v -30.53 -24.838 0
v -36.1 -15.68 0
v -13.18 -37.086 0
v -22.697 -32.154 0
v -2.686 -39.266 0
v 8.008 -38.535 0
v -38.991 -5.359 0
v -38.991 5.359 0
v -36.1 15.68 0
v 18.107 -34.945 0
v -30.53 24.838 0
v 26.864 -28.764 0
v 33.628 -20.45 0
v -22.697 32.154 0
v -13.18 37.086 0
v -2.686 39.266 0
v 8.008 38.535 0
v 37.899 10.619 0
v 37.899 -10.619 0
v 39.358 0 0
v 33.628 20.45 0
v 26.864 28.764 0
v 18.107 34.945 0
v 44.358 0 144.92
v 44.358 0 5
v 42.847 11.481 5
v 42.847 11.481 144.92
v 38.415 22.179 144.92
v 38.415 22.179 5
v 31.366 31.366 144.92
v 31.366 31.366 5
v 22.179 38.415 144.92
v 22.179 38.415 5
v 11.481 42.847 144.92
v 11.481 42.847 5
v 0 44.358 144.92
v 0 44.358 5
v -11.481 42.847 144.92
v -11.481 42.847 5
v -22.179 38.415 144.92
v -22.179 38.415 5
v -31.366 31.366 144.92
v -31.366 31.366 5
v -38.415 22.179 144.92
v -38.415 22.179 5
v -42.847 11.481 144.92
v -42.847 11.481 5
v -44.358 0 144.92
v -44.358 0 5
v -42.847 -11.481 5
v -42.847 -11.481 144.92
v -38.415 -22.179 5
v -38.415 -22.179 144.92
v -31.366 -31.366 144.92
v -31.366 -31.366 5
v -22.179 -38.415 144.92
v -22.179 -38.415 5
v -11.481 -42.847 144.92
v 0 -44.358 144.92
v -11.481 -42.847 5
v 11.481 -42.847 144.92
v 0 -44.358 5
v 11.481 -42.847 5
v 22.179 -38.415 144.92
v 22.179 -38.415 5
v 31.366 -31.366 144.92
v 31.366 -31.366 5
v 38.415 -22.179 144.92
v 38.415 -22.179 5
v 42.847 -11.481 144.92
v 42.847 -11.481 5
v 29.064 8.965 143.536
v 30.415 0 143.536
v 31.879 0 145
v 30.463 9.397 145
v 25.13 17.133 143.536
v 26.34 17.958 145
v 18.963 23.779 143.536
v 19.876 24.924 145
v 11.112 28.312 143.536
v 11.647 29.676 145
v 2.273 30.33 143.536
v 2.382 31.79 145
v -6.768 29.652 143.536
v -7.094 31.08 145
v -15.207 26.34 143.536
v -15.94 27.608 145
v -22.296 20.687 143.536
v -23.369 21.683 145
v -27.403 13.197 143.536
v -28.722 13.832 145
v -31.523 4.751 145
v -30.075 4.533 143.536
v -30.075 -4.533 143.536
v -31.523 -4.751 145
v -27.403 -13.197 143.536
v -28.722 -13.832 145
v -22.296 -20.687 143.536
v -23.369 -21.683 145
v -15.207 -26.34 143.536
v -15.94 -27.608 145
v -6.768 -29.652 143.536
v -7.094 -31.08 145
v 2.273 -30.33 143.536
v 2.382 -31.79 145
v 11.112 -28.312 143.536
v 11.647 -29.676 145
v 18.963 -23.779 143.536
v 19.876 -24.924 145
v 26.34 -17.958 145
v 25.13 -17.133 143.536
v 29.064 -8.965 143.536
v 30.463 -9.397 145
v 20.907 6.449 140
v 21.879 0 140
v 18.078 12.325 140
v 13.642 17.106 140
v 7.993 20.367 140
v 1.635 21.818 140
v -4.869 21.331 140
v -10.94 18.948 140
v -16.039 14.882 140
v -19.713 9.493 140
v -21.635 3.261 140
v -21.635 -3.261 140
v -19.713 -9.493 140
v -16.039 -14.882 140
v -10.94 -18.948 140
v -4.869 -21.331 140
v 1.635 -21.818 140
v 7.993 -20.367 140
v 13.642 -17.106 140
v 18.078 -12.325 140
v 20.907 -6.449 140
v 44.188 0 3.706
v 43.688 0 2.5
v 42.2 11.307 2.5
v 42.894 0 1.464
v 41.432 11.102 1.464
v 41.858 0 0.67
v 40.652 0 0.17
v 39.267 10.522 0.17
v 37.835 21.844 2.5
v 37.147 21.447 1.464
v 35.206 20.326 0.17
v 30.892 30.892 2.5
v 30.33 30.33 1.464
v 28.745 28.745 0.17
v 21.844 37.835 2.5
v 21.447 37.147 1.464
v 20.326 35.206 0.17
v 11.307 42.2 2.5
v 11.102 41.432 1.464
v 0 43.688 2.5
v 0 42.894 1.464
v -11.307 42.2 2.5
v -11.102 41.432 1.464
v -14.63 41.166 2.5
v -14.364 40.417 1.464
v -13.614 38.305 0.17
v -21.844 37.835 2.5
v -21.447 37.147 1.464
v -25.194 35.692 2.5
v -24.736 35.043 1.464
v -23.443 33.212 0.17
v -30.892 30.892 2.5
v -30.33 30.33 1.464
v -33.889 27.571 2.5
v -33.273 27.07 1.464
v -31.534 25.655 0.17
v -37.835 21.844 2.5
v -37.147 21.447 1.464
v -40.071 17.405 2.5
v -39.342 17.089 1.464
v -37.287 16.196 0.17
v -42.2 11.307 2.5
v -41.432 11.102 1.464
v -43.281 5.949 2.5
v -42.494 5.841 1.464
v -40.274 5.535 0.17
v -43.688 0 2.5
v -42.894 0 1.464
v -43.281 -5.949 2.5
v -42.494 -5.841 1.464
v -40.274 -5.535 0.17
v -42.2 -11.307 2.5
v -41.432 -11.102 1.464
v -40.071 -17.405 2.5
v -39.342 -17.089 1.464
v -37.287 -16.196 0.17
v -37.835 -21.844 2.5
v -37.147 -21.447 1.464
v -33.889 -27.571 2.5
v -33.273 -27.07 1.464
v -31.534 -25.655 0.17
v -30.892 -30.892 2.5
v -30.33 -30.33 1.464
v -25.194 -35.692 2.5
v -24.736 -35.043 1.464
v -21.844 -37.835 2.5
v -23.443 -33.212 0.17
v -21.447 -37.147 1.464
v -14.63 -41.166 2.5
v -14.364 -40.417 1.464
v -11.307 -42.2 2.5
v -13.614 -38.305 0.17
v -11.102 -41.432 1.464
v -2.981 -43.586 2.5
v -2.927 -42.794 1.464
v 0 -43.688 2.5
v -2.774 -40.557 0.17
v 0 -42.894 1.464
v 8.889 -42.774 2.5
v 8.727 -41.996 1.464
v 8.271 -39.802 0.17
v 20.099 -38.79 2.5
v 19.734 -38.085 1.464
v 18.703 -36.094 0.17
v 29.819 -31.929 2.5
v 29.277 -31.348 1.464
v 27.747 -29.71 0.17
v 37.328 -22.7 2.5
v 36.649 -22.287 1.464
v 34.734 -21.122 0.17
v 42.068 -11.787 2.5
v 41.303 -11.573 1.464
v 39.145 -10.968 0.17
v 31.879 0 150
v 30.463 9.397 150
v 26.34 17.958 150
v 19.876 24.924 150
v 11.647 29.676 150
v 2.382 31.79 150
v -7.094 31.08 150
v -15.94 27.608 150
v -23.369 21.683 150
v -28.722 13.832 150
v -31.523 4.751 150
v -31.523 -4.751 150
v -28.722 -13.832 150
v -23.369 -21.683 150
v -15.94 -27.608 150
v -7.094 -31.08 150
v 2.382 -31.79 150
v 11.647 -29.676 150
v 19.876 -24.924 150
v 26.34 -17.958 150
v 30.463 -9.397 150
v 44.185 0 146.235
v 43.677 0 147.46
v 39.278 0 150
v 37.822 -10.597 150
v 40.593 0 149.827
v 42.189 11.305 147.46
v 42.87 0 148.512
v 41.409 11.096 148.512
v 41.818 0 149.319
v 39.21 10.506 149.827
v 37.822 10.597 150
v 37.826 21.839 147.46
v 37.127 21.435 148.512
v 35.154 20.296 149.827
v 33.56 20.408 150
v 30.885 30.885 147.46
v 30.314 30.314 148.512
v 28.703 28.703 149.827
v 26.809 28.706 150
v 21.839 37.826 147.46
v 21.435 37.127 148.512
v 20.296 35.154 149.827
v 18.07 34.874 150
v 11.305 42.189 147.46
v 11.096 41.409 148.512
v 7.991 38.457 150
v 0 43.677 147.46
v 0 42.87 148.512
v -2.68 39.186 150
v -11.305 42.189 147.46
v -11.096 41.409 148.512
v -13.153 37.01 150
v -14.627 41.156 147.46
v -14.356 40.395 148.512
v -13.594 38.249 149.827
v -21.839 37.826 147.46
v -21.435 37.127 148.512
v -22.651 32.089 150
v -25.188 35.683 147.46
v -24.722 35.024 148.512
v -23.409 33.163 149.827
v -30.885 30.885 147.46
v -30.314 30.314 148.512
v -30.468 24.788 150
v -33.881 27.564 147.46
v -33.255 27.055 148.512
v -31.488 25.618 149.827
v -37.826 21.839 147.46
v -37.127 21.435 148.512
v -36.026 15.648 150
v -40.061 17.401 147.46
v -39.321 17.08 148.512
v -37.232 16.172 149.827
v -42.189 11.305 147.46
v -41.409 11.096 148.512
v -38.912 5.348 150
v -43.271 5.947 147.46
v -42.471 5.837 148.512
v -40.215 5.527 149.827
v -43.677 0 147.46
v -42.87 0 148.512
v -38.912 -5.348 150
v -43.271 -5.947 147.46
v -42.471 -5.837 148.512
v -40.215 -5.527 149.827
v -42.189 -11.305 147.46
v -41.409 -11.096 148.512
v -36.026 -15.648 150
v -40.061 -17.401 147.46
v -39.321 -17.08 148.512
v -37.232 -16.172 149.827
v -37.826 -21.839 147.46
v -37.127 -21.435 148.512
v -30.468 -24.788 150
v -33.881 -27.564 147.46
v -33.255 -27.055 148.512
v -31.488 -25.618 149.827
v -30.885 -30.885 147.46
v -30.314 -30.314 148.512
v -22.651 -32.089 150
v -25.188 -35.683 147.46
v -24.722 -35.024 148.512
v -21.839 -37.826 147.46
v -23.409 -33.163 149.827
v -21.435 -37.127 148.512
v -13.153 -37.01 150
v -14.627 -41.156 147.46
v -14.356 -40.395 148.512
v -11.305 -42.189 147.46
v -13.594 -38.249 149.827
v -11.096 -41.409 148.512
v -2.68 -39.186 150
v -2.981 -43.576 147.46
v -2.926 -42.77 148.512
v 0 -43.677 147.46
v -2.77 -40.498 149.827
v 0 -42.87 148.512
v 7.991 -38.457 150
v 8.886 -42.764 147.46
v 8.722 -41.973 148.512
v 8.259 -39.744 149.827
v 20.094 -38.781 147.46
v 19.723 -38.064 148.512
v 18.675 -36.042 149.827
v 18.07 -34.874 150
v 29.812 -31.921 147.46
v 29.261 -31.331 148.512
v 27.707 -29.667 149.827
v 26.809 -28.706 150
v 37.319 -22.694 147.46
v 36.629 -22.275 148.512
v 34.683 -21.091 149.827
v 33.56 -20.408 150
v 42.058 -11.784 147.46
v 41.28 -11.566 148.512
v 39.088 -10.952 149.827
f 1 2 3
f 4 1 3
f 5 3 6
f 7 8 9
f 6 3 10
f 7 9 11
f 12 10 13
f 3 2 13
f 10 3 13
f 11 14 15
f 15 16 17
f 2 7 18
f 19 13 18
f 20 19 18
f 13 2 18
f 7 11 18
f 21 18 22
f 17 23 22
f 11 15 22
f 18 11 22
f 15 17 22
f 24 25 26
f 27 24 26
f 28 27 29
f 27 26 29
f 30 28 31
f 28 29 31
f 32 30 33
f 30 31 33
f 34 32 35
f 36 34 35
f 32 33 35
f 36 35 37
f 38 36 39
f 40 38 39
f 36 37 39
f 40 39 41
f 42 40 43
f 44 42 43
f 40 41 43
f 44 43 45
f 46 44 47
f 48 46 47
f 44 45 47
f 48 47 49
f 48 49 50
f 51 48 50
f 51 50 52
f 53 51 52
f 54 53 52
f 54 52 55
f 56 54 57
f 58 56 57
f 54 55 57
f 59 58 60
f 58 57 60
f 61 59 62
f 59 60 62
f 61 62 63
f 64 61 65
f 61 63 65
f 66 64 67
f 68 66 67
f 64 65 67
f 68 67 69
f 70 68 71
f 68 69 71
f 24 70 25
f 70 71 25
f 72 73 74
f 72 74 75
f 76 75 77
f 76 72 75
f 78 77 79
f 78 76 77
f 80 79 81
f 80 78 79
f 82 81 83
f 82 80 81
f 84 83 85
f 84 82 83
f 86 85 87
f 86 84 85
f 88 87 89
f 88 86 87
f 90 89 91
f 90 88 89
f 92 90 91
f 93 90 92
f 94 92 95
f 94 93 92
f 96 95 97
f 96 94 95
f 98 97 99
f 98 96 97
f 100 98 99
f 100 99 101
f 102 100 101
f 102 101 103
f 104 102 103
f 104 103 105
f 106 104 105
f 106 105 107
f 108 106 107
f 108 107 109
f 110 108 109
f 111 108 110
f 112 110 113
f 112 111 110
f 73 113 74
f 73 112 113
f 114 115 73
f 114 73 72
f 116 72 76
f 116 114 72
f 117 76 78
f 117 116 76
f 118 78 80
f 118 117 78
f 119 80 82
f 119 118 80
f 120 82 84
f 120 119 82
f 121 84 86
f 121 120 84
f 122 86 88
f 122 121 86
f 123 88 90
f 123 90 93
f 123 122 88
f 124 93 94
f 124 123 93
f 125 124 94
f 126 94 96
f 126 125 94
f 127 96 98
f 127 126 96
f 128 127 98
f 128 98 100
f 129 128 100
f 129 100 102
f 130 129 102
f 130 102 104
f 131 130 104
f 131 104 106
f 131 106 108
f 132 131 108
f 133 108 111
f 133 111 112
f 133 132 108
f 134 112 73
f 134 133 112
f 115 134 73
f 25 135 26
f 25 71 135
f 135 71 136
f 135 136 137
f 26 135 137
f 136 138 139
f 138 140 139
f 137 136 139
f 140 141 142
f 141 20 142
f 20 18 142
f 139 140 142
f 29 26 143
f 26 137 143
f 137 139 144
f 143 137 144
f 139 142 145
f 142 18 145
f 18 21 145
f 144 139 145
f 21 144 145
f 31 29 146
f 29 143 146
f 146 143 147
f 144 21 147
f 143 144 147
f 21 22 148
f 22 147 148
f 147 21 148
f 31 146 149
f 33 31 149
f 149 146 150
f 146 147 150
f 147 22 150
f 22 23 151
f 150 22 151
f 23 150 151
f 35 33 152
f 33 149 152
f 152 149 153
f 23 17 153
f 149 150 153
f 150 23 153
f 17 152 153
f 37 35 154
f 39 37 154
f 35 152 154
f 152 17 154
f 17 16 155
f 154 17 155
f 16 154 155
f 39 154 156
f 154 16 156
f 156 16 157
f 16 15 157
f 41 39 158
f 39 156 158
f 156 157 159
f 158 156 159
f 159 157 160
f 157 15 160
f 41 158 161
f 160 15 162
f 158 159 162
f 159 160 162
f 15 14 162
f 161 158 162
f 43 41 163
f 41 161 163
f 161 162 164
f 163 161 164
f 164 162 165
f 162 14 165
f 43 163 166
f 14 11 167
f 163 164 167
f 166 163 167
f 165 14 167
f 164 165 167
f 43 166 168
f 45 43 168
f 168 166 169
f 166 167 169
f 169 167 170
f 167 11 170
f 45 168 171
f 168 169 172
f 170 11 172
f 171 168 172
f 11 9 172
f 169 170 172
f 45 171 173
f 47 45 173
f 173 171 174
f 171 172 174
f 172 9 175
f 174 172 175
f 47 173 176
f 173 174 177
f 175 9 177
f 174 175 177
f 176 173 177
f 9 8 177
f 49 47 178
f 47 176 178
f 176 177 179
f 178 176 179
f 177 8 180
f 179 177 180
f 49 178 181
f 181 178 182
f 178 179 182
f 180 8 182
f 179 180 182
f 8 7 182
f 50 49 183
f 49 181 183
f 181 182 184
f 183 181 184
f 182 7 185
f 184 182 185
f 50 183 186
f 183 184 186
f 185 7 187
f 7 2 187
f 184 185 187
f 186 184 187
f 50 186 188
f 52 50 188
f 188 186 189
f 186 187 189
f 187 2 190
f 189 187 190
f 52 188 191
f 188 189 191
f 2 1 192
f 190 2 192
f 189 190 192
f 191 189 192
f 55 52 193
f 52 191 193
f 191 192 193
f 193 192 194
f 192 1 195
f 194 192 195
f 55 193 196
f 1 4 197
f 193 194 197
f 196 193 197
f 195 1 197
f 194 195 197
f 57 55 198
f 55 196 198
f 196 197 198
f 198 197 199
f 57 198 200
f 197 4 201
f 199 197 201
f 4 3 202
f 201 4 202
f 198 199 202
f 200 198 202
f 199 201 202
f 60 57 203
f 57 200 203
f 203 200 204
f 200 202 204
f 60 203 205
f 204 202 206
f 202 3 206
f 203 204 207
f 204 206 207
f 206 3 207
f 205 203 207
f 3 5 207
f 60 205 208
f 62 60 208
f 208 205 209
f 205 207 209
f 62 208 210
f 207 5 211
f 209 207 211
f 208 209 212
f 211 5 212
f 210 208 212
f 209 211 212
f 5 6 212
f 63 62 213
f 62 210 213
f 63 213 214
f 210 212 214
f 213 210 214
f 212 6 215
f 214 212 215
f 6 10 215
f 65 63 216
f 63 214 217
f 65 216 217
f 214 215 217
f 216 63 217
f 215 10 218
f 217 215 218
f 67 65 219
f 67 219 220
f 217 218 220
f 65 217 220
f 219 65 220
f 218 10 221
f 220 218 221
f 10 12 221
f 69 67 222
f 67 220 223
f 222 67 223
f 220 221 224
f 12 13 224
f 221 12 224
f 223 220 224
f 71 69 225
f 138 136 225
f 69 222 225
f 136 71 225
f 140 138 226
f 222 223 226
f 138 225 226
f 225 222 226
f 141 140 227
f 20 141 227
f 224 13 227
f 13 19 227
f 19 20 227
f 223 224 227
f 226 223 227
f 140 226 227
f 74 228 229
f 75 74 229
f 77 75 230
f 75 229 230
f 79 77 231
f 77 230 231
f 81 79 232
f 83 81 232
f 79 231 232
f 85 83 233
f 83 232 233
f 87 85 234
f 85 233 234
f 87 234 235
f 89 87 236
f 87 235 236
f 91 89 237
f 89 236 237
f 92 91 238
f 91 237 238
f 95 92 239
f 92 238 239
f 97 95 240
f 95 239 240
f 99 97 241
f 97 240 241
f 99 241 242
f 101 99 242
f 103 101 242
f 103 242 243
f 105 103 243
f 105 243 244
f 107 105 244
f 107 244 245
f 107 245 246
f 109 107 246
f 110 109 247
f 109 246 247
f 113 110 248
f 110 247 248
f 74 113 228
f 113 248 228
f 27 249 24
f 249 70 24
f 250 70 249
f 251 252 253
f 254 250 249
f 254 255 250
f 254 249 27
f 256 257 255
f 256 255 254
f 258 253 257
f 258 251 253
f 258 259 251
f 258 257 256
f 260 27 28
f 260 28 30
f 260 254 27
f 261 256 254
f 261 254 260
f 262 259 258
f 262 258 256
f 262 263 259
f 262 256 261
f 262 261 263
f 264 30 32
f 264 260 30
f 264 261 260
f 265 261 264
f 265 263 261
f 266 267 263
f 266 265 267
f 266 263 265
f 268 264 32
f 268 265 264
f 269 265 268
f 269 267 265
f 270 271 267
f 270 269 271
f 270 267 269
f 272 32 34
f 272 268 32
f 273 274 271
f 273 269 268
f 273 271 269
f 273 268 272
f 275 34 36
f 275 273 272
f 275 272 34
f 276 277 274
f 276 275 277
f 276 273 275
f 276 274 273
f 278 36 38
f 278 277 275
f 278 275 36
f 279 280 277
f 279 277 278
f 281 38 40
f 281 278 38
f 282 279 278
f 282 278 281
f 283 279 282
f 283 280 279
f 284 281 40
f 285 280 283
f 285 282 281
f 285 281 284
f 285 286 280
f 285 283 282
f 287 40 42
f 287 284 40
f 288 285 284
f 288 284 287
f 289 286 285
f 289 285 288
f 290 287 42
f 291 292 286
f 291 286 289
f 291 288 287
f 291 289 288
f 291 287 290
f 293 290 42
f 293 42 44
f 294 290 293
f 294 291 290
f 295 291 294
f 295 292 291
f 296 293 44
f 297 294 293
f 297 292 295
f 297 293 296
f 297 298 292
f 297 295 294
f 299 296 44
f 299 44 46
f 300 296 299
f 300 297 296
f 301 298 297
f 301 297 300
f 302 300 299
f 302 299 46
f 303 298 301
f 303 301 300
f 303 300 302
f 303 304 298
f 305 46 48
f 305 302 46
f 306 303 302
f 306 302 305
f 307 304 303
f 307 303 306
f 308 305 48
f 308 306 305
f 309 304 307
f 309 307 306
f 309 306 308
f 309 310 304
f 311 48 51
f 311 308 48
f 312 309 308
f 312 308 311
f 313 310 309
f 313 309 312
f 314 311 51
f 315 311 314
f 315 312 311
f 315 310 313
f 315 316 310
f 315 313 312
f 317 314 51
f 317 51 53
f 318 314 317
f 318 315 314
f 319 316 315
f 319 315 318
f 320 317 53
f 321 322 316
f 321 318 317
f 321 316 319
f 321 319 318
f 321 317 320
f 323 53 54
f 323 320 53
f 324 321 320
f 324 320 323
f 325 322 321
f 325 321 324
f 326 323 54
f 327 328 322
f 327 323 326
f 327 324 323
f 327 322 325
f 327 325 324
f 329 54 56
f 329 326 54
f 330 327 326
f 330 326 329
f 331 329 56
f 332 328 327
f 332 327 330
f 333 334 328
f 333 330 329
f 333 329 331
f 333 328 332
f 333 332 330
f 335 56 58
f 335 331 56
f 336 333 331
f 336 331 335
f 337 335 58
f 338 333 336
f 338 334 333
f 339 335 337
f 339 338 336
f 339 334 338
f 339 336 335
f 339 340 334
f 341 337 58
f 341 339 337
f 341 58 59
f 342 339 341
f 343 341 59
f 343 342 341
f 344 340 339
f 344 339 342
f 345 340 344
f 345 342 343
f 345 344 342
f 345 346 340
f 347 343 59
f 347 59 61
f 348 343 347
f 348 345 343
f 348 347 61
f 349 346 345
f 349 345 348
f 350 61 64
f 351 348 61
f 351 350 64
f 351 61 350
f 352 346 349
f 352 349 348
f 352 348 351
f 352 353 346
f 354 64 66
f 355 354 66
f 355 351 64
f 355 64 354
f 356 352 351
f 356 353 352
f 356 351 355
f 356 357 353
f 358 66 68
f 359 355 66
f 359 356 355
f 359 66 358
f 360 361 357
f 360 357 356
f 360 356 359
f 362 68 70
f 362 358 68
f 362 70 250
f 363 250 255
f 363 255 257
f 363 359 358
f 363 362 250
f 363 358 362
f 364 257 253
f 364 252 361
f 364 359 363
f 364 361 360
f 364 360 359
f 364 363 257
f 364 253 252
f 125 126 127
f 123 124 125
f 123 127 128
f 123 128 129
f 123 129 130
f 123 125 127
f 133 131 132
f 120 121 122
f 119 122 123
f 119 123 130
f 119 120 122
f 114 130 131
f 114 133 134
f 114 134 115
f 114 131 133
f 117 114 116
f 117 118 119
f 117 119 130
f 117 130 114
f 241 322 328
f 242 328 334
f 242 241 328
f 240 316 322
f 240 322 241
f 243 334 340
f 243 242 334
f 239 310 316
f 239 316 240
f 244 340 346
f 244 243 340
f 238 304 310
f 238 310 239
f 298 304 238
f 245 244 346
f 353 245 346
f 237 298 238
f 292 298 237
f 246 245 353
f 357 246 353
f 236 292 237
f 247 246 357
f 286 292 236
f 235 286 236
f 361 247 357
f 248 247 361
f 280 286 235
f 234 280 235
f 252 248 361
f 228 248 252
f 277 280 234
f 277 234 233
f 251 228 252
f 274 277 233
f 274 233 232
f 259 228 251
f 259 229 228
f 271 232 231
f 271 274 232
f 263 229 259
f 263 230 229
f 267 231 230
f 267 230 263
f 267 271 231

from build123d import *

# Parameters (mm, degrees)
F0_R      = 44.358045
F1_DEPTH  = 150
F2_R      = 5.08
F3_R      = 31.478982
F4_DEPTH  = 20
F5_R      = 31.879321
F6_DEPTH  = 10
F7_SIZE   = 5
F8_SIZE   = 5
F9_R      = 5
F10_R     = 31.442334
F11_DEPTH = 25
F12_R     = 31.785479
F13_DEPTH = 25
F14_R     = 32.188515
F15_DEPTH = 25


with BuildPart() as f1:
    # F0 (on Top) → F1 (new body)
    with BuildSketch(Plane.XY):
        Circle(F0_R)
    extrude(amount=F1_DEPTH)

    # F2
    f2_edges = [f1.edges().sort_by_distance(p)[0] for p in [
        (-44.358045, 0, 150),
    ]]
    fillet(f2_edges, radius=F2_R)

    # F3 (on face) → F4 (join)
    with BuildSketch(Plane.XY.offset(150)):
        Circle(F3_R)
    extrude(amount=-F4_DEPTH)

    # F5 (on face) → F6 (cut)
    with BuildSketch(Plane.XY.offset(150)):
        Circle(F5_R)
    extrude(amount=-F6_DEPTH, mode=Mode.SUBTRACT)

    # F7
    f7_edges = [f1.edges().sort_by_distance(p)[0] for p in [
        (-31.879321, 0, 140),
    ]]
    chamfer(f7_edges, length=F7_SIZE)

    # F8
    f8_edges = [f1.edges().sort_by_distance(p)[0] for p in [
        (-26.879321, 0, 140),
    ]]
    chamfer(f8_edges, length=F8_SIZE)

    # F9
    f9_edges = [f1.edges().sort_by_distance(p)[0] for p in [
        (-44.358045, 0, 0),
    ]]
    fillet(f9_edges, radius=F9_R)

    # F10 (on face) → F11 (join)
    with BuildSketch(Plane(origin=(0, 0, 0), x_dir=(1, 0, 0), z_dir=(0, 0, -1))):
        Circle(F10_R)
    extrude(amount=-F11_DEPTH)

    # F12 (on face) → F13 (join)
    with BuildSketch(Plane(origin=(0, 0, 0), x_dir=(1, 0, 0), z_dir=(0, 0, -1))):
        Circle(F12_R)
    extrude(amount=-F13_DEPTH)

    # F14 (on face) → F15 (join)
    with BuildSketch(Plane(origin=(0, 0, 0), x_dir=(1, 0, 0), z_dir=(0, 0, -1))):
        Circle(F14_R)
    extrude(amount=-F15_DEPTH)


solid = f1.part
